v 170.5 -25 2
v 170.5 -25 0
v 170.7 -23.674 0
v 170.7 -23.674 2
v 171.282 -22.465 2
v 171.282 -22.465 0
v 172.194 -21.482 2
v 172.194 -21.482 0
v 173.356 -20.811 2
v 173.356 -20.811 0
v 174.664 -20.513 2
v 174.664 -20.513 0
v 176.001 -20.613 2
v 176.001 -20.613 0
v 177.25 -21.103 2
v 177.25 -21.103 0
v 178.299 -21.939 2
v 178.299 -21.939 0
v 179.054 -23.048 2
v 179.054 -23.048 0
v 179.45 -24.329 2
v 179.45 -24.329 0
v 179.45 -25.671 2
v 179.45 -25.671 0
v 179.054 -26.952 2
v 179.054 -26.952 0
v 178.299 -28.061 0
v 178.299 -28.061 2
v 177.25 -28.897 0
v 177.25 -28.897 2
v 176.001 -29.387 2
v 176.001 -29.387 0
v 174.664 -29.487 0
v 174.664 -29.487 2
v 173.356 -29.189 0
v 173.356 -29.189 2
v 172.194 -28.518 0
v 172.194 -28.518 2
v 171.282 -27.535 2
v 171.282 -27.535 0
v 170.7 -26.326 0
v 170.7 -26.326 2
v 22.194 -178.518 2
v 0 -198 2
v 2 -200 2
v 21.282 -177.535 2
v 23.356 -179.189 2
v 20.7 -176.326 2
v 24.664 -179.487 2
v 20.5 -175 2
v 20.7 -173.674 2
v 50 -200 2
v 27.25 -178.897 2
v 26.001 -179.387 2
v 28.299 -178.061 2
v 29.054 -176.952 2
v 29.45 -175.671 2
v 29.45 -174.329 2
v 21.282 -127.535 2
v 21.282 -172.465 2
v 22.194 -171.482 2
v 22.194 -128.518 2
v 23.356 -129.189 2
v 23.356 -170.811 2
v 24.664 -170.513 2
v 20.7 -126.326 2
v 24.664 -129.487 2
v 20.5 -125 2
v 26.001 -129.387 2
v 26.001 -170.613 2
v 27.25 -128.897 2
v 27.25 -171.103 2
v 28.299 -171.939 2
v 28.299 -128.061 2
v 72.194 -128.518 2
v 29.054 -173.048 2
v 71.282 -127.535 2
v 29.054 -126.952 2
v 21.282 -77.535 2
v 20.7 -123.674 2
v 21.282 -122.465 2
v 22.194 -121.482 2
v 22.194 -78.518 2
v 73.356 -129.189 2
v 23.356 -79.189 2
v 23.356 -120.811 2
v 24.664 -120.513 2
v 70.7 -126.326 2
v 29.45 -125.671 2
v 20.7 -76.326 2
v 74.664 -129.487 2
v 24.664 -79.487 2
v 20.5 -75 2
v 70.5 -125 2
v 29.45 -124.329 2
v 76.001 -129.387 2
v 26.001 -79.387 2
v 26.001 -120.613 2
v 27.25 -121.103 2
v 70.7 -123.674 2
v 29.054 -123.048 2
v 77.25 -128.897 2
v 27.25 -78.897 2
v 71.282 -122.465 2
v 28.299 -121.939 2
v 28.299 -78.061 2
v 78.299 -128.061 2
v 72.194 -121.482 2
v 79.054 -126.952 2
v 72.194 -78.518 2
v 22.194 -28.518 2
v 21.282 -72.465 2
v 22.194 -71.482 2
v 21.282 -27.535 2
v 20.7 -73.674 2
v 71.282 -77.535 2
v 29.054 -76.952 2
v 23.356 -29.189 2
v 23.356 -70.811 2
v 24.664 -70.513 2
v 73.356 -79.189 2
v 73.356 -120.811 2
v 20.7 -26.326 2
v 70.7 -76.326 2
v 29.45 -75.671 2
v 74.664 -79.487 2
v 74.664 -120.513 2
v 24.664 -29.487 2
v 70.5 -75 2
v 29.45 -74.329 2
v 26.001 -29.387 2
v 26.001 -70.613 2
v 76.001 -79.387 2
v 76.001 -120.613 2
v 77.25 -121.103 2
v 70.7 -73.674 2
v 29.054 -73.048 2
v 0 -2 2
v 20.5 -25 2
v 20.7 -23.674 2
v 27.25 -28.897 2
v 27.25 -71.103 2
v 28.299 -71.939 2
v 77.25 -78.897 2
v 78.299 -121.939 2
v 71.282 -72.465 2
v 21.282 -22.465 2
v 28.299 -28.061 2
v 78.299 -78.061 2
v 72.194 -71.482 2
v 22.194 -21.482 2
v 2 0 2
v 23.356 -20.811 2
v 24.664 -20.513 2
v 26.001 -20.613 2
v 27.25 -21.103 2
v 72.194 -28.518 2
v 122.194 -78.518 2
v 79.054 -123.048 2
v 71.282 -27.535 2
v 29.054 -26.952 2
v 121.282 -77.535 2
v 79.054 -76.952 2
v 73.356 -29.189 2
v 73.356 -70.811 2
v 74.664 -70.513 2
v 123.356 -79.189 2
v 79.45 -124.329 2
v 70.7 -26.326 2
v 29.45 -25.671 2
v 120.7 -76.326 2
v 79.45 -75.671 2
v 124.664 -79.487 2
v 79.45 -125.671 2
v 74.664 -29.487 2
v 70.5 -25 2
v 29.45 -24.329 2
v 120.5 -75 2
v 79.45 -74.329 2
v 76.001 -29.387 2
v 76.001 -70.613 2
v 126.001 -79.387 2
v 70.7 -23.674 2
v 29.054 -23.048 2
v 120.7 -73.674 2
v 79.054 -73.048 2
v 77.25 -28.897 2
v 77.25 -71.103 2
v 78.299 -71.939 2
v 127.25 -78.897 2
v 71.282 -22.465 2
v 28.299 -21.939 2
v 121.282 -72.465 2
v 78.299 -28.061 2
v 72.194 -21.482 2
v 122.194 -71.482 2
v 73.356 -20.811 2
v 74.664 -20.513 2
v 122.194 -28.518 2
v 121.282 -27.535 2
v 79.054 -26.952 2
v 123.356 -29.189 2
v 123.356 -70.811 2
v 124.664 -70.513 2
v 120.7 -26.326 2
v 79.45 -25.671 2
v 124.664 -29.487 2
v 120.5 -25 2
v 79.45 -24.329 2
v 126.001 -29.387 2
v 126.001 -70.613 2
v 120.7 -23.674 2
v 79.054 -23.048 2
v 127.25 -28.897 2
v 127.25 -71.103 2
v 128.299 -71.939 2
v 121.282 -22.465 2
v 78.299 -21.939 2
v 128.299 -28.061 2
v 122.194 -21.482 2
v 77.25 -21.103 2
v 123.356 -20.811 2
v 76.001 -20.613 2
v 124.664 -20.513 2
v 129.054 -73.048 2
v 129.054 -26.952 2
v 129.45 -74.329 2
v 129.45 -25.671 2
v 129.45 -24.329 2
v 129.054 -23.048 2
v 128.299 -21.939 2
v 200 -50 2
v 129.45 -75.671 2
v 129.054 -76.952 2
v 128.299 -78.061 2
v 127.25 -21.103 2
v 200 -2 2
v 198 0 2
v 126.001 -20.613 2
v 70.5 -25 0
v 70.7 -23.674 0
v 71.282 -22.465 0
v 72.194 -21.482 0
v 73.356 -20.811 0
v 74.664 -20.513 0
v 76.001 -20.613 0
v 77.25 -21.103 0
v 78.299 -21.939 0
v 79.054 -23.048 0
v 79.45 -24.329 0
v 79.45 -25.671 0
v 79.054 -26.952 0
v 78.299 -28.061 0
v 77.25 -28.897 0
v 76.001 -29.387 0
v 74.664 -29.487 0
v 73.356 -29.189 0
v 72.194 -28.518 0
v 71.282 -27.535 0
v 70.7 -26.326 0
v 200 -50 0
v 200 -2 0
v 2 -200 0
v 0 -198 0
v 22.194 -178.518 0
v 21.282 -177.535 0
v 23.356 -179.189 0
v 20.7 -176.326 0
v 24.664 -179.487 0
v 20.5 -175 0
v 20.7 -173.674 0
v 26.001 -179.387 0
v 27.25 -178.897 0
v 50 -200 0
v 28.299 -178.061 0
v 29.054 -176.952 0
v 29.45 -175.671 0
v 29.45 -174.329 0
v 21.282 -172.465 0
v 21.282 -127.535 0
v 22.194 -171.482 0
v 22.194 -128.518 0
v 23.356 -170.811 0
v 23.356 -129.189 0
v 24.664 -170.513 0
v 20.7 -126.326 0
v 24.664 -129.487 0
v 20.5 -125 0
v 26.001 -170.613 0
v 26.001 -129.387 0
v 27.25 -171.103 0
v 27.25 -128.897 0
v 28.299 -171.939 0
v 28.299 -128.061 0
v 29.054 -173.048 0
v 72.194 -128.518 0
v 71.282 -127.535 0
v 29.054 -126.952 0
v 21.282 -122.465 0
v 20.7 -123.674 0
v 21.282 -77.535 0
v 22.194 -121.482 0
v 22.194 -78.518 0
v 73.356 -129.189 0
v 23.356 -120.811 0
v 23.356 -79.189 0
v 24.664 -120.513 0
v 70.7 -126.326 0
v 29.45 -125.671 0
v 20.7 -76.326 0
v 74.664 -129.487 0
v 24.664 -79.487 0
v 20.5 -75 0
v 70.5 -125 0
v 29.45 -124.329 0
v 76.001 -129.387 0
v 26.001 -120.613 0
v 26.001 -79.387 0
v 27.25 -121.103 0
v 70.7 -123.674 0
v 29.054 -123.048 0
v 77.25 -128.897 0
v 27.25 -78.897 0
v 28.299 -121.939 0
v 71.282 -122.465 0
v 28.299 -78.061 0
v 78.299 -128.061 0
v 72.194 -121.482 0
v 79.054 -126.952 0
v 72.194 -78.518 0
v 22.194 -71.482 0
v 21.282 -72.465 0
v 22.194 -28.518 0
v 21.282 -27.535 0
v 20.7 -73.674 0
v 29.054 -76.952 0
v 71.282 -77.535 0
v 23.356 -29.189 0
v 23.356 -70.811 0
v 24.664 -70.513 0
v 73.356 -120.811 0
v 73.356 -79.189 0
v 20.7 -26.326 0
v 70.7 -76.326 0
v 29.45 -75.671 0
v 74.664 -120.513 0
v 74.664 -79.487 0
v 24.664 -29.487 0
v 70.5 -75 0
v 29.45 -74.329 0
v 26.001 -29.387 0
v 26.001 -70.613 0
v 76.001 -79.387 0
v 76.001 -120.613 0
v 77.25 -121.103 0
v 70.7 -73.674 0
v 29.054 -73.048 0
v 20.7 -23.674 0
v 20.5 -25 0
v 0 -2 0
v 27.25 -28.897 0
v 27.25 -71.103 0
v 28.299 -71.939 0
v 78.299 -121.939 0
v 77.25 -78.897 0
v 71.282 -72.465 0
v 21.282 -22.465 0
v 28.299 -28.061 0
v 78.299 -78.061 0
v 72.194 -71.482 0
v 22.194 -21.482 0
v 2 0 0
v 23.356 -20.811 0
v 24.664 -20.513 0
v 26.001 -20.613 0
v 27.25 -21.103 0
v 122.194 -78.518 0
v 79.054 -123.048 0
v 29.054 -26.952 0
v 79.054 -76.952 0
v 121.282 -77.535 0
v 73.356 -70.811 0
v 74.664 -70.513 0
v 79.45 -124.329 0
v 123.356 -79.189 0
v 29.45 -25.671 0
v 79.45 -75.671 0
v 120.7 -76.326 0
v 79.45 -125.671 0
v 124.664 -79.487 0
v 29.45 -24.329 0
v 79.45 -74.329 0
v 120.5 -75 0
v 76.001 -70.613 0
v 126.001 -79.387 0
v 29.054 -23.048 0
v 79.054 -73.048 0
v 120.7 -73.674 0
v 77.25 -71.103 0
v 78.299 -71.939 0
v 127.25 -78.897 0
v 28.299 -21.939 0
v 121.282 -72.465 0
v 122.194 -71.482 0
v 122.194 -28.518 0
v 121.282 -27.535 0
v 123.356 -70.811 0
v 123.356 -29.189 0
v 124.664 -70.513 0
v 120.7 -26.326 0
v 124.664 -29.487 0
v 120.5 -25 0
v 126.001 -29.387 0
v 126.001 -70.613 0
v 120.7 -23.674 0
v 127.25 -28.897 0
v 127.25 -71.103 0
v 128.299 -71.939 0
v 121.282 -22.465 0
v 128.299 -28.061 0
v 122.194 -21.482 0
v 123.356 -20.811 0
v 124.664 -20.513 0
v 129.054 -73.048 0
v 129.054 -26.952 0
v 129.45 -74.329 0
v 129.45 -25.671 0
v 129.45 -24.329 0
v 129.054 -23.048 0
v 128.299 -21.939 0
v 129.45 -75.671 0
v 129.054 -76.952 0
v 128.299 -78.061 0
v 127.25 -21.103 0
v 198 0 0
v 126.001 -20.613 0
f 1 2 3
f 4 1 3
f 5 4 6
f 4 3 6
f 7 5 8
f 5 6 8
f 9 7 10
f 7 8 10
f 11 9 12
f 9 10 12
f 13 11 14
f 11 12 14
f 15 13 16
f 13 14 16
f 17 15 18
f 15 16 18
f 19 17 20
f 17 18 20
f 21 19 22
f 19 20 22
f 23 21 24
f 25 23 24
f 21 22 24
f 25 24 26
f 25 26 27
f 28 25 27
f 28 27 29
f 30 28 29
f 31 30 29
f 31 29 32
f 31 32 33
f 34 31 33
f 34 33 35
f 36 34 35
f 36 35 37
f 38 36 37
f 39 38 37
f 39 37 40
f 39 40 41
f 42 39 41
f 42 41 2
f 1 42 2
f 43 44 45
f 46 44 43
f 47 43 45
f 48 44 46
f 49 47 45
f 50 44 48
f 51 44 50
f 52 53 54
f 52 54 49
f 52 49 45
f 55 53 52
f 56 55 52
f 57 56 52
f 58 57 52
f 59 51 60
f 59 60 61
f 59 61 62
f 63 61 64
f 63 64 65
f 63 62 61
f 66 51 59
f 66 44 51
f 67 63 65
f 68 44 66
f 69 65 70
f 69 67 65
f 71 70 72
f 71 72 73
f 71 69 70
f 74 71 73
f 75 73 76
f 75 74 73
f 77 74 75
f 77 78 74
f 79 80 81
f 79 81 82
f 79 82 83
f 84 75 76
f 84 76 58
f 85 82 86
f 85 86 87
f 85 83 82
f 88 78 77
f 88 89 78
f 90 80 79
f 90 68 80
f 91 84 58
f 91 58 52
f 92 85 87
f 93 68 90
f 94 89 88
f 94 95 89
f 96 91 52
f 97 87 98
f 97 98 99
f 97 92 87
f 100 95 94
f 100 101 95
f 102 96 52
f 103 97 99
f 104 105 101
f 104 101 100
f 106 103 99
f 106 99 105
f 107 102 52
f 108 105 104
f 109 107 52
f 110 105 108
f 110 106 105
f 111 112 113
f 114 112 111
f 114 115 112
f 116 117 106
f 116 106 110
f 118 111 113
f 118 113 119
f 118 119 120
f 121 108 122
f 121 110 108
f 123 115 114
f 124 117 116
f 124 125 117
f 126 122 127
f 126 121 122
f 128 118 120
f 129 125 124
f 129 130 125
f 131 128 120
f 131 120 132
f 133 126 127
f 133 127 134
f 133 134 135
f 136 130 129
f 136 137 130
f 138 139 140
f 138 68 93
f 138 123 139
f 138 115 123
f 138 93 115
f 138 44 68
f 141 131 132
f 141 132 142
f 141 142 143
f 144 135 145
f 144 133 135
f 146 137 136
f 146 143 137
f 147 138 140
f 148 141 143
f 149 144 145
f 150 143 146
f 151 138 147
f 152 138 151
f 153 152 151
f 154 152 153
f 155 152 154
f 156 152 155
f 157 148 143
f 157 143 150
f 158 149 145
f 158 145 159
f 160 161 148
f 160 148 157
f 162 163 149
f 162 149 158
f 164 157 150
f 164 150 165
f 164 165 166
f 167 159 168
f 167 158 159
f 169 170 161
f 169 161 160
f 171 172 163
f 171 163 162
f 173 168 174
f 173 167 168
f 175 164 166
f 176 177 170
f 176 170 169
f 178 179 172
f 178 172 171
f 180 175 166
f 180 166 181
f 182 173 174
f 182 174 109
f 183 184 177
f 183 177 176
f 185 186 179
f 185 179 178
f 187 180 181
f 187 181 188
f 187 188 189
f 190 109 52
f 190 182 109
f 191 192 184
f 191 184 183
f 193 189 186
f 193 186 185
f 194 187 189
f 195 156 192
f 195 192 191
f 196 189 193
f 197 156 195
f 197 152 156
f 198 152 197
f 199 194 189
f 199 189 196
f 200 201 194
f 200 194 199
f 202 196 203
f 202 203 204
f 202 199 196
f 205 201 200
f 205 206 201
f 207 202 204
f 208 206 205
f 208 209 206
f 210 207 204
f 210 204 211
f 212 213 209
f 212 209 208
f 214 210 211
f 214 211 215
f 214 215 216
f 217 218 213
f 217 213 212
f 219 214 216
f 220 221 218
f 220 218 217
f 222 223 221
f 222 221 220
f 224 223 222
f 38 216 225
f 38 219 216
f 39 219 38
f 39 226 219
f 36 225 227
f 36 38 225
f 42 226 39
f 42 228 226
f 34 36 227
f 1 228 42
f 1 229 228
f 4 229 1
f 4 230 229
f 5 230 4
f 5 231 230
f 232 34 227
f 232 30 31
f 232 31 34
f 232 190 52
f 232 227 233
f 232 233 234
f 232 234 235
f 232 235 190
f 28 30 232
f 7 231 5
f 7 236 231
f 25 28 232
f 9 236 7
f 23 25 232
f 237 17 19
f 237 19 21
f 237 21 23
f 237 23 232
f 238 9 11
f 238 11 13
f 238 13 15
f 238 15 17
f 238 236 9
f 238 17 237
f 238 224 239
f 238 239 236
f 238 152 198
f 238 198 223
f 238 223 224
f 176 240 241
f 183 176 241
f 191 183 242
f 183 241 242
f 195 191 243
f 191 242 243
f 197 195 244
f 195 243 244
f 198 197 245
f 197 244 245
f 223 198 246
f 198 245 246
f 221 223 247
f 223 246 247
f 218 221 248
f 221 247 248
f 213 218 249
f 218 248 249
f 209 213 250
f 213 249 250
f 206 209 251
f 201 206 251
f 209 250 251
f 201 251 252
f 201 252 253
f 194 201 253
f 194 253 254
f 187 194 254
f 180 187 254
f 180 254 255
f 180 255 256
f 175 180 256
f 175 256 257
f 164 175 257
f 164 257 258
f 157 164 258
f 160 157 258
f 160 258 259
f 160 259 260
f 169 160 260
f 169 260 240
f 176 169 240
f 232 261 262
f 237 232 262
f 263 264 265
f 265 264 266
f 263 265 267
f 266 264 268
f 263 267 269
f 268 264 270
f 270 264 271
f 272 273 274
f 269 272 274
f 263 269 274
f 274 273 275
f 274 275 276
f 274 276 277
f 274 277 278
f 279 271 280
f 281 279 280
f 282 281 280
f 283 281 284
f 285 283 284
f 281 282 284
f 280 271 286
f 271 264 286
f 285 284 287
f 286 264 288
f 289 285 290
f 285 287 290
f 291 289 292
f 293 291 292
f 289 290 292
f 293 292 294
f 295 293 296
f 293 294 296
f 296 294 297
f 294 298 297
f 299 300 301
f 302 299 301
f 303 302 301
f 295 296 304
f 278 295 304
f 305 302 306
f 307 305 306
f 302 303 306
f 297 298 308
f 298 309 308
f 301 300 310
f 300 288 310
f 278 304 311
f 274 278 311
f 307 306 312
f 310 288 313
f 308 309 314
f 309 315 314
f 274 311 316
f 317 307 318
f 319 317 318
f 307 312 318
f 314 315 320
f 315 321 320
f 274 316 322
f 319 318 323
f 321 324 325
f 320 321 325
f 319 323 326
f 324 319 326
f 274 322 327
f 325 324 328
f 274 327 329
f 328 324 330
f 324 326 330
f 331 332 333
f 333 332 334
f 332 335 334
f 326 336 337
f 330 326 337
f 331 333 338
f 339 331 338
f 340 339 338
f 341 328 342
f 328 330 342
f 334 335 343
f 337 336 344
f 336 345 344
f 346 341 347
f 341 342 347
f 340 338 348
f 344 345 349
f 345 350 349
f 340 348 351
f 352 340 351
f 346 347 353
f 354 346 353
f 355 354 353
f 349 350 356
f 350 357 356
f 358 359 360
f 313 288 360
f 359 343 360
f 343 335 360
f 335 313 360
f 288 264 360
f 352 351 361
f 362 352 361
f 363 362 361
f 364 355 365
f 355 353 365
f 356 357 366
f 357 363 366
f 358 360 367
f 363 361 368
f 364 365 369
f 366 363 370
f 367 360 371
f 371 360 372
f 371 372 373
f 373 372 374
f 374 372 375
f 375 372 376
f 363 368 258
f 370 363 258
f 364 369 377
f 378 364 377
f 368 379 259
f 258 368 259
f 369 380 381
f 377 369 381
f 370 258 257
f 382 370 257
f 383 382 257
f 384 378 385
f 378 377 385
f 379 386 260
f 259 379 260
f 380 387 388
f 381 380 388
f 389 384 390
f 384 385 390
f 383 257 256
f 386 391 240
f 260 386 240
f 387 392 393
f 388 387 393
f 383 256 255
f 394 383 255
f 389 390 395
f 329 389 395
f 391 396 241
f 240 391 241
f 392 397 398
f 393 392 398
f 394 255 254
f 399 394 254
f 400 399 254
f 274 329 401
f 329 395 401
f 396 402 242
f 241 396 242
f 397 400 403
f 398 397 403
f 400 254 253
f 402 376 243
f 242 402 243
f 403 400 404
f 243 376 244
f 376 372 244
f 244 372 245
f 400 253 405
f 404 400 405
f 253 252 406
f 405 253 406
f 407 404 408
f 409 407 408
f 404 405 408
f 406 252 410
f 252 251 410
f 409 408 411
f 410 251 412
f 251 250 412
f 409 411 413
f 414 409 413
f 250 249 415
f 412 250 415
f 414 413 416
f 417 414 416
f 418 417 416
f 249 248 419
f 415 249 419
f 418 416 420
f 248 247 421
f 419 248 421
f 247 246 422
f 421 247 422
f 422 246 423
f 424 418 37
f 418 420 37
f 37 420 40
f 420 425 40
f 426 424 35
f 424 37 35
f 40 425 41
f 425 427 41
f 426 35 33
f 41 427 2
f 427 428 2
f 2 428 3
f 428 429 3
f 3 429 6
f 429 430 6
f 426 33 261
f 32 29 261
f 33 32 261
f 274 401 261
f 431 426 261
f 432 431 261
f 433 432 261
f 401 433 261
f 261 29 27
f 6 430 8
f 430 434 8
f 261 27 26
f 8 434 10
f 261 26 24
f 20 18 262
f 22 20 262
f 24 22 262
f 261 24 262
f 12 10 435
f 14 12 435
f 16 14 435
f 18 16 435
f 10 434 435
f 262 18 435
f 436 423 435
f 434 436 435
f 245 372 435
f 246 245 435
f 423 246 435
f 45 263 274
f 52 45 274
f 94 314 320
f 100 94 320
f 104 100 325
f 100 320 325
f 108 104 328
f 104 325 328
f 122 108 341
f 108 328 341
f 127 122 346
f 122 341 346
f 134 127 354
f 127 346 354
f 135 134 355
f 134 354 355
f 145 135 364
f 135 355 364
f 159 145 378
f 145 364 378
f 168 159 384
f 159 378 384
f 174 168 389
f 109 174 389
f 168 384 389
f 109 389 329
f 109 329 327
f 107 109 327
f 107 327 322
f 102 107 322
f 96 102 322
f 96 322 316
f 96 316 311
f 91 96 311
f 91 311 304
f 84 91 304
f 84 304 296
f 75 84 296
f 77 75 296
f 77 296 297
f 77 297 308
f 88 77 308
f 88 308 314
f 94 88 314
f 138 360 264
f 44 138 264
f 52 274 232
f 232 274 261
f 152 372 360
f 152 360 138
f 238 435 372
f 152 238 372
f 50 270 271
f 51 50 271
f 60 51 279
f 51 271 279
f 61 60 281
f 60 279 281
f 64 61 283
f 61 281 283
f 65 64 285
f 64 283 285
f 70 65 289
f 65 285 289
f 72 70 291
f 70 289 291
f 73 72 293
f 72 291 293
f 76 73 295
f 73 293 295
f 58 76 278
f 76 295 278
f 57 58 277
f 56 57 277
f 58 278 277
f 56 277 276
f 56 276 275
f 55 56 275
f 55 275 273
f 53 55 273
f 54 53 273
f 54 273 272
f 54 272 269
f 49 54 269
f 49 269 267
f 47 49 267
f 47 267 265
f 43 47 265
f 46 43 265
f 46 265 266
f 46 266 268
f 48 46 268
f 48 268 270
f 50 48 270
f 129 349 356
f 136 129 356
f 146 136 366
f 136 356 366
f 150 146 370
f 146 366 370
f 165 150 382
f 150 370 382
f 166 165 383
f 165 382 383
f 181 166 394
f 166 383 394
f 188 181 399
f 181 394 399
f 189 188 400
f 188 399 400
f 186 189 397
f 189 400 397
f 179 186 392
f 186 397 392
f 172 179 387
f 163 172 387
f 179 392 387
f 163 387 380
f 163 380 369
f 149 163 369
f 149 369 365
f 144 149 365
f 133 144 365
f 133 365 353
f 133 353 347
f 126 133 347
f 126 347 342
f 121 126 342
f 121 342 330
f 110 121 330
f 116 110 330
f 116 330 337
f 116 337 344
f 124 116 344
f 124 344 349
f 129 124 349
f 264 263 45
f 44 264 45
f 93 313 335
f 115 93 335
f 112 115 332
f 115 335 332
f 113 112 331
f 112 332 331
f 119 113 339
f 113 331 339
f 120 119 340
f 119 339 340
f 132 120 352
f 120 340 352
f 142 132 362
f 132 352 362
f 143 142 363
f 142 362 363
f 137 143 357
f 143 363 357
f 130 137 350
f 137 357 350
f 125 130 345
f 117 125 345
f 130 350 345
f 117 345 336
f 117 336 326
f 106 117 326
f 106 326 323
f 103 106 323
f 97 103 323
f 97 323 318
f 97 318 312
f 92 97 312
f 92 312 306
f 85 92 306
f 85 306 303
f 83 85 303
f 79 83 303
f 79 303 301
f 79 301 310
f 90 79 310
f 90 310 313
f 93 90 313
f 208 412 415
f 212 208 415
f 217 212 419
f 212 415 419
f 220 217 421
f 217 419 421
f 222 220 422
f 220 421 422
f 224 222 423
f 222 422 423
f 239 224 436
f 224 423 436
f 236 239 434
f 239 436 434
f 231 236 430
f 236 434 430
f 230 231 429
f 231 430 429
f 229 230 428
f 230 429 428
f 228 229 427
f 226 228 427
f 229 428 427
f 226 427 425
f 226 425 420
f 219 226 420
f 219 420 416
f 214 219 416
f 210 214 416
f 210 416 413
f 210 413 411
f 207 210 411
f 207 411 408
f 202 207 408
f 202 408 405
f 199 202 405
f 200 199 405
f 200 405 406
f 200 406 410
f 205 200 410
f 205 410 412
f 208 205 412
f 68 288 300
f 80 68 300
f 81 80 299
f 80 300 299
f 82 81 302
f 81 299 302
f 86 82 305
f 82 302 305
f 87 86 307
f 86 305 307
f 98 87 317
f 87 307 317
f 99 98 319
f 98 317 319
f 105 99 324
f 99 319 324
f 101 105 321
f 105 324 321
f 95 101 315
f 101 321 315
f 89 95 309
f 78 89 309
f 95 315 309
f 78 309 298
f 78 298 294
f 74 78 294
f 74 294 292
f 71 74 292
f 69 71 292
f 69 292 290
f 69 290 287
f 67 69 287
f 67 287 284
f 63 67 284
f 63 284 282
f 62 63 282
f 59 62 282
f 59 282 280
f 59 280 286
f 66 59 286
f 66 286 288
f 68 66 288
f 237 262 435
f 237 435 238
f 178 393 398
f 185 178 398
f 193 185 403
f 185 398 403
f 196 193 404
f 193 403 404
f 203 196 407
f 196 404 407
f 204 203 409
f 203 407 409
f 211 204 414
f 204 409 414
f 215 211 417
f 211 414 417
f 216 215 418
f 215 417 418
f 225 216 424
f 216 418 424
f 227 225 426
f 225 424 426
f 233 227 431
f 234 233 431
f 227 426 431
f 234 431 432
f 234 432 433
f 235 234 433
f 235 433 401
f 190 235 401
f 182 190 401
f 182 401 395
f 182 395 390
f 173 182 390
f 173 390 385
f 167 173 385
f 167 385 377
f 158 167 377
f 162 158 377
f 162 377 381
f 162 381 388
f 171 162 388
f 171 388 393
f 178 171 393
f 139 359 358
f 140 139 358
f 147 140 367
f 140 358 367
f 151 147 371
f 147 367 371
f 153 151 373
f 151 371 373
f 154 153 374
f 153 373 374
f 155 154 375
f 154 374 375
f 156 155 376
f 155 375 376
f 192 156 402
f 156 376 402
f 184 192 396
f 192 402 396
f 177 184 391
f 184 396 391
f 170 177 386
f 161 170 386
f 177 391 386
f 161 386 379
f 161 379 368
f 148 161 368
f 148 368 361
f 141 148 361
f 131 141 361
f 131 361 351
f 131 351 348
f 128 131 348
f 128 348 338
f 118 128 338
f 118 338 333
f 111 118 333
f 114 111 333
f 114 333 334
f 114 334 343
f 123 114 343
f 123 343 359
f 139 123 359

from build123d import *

# Parameters (mm, degrees)
EXTRUDE_1_DEPTH   = 2
CHAMFER_1_SIZE    = 2
HOLE_WIZARD_M81_D = 9


with BuildPart() as part:
    # Эскиз1 → Бобышка-Вытянуть1 (new body)
    with BuildSketch(Plane.XY):
        Polygon((0, 0), (0, -200), (50, -200), (200, -50), (200, 0), align=None)
    extrude(amount=EXTRUDE_1_DEPTH)

    # Фаска1
    chamfer_1_edges = [part.edges().sort_by_distance(p)[0] for p in [
        (200, 0, 1),
        (0, -200, 1),
        (0, 0, 1),
    ]]
    chamfer(chamfer_1_edges, length=CHAMFER_1_SIZE)

    # Отверстие с зазором M81 (through all)
    with Locations(Plane.XY.offset(2)):
        with Locations((25, -25), (75, -25), (125, -25), (175, -25), (25, -75), (25, -125), (25, -175), (75, -125), (125, -75), (75, -75)):
            Hole(HOLE_WIZARD_M81_D / 2)


solid = part.part
